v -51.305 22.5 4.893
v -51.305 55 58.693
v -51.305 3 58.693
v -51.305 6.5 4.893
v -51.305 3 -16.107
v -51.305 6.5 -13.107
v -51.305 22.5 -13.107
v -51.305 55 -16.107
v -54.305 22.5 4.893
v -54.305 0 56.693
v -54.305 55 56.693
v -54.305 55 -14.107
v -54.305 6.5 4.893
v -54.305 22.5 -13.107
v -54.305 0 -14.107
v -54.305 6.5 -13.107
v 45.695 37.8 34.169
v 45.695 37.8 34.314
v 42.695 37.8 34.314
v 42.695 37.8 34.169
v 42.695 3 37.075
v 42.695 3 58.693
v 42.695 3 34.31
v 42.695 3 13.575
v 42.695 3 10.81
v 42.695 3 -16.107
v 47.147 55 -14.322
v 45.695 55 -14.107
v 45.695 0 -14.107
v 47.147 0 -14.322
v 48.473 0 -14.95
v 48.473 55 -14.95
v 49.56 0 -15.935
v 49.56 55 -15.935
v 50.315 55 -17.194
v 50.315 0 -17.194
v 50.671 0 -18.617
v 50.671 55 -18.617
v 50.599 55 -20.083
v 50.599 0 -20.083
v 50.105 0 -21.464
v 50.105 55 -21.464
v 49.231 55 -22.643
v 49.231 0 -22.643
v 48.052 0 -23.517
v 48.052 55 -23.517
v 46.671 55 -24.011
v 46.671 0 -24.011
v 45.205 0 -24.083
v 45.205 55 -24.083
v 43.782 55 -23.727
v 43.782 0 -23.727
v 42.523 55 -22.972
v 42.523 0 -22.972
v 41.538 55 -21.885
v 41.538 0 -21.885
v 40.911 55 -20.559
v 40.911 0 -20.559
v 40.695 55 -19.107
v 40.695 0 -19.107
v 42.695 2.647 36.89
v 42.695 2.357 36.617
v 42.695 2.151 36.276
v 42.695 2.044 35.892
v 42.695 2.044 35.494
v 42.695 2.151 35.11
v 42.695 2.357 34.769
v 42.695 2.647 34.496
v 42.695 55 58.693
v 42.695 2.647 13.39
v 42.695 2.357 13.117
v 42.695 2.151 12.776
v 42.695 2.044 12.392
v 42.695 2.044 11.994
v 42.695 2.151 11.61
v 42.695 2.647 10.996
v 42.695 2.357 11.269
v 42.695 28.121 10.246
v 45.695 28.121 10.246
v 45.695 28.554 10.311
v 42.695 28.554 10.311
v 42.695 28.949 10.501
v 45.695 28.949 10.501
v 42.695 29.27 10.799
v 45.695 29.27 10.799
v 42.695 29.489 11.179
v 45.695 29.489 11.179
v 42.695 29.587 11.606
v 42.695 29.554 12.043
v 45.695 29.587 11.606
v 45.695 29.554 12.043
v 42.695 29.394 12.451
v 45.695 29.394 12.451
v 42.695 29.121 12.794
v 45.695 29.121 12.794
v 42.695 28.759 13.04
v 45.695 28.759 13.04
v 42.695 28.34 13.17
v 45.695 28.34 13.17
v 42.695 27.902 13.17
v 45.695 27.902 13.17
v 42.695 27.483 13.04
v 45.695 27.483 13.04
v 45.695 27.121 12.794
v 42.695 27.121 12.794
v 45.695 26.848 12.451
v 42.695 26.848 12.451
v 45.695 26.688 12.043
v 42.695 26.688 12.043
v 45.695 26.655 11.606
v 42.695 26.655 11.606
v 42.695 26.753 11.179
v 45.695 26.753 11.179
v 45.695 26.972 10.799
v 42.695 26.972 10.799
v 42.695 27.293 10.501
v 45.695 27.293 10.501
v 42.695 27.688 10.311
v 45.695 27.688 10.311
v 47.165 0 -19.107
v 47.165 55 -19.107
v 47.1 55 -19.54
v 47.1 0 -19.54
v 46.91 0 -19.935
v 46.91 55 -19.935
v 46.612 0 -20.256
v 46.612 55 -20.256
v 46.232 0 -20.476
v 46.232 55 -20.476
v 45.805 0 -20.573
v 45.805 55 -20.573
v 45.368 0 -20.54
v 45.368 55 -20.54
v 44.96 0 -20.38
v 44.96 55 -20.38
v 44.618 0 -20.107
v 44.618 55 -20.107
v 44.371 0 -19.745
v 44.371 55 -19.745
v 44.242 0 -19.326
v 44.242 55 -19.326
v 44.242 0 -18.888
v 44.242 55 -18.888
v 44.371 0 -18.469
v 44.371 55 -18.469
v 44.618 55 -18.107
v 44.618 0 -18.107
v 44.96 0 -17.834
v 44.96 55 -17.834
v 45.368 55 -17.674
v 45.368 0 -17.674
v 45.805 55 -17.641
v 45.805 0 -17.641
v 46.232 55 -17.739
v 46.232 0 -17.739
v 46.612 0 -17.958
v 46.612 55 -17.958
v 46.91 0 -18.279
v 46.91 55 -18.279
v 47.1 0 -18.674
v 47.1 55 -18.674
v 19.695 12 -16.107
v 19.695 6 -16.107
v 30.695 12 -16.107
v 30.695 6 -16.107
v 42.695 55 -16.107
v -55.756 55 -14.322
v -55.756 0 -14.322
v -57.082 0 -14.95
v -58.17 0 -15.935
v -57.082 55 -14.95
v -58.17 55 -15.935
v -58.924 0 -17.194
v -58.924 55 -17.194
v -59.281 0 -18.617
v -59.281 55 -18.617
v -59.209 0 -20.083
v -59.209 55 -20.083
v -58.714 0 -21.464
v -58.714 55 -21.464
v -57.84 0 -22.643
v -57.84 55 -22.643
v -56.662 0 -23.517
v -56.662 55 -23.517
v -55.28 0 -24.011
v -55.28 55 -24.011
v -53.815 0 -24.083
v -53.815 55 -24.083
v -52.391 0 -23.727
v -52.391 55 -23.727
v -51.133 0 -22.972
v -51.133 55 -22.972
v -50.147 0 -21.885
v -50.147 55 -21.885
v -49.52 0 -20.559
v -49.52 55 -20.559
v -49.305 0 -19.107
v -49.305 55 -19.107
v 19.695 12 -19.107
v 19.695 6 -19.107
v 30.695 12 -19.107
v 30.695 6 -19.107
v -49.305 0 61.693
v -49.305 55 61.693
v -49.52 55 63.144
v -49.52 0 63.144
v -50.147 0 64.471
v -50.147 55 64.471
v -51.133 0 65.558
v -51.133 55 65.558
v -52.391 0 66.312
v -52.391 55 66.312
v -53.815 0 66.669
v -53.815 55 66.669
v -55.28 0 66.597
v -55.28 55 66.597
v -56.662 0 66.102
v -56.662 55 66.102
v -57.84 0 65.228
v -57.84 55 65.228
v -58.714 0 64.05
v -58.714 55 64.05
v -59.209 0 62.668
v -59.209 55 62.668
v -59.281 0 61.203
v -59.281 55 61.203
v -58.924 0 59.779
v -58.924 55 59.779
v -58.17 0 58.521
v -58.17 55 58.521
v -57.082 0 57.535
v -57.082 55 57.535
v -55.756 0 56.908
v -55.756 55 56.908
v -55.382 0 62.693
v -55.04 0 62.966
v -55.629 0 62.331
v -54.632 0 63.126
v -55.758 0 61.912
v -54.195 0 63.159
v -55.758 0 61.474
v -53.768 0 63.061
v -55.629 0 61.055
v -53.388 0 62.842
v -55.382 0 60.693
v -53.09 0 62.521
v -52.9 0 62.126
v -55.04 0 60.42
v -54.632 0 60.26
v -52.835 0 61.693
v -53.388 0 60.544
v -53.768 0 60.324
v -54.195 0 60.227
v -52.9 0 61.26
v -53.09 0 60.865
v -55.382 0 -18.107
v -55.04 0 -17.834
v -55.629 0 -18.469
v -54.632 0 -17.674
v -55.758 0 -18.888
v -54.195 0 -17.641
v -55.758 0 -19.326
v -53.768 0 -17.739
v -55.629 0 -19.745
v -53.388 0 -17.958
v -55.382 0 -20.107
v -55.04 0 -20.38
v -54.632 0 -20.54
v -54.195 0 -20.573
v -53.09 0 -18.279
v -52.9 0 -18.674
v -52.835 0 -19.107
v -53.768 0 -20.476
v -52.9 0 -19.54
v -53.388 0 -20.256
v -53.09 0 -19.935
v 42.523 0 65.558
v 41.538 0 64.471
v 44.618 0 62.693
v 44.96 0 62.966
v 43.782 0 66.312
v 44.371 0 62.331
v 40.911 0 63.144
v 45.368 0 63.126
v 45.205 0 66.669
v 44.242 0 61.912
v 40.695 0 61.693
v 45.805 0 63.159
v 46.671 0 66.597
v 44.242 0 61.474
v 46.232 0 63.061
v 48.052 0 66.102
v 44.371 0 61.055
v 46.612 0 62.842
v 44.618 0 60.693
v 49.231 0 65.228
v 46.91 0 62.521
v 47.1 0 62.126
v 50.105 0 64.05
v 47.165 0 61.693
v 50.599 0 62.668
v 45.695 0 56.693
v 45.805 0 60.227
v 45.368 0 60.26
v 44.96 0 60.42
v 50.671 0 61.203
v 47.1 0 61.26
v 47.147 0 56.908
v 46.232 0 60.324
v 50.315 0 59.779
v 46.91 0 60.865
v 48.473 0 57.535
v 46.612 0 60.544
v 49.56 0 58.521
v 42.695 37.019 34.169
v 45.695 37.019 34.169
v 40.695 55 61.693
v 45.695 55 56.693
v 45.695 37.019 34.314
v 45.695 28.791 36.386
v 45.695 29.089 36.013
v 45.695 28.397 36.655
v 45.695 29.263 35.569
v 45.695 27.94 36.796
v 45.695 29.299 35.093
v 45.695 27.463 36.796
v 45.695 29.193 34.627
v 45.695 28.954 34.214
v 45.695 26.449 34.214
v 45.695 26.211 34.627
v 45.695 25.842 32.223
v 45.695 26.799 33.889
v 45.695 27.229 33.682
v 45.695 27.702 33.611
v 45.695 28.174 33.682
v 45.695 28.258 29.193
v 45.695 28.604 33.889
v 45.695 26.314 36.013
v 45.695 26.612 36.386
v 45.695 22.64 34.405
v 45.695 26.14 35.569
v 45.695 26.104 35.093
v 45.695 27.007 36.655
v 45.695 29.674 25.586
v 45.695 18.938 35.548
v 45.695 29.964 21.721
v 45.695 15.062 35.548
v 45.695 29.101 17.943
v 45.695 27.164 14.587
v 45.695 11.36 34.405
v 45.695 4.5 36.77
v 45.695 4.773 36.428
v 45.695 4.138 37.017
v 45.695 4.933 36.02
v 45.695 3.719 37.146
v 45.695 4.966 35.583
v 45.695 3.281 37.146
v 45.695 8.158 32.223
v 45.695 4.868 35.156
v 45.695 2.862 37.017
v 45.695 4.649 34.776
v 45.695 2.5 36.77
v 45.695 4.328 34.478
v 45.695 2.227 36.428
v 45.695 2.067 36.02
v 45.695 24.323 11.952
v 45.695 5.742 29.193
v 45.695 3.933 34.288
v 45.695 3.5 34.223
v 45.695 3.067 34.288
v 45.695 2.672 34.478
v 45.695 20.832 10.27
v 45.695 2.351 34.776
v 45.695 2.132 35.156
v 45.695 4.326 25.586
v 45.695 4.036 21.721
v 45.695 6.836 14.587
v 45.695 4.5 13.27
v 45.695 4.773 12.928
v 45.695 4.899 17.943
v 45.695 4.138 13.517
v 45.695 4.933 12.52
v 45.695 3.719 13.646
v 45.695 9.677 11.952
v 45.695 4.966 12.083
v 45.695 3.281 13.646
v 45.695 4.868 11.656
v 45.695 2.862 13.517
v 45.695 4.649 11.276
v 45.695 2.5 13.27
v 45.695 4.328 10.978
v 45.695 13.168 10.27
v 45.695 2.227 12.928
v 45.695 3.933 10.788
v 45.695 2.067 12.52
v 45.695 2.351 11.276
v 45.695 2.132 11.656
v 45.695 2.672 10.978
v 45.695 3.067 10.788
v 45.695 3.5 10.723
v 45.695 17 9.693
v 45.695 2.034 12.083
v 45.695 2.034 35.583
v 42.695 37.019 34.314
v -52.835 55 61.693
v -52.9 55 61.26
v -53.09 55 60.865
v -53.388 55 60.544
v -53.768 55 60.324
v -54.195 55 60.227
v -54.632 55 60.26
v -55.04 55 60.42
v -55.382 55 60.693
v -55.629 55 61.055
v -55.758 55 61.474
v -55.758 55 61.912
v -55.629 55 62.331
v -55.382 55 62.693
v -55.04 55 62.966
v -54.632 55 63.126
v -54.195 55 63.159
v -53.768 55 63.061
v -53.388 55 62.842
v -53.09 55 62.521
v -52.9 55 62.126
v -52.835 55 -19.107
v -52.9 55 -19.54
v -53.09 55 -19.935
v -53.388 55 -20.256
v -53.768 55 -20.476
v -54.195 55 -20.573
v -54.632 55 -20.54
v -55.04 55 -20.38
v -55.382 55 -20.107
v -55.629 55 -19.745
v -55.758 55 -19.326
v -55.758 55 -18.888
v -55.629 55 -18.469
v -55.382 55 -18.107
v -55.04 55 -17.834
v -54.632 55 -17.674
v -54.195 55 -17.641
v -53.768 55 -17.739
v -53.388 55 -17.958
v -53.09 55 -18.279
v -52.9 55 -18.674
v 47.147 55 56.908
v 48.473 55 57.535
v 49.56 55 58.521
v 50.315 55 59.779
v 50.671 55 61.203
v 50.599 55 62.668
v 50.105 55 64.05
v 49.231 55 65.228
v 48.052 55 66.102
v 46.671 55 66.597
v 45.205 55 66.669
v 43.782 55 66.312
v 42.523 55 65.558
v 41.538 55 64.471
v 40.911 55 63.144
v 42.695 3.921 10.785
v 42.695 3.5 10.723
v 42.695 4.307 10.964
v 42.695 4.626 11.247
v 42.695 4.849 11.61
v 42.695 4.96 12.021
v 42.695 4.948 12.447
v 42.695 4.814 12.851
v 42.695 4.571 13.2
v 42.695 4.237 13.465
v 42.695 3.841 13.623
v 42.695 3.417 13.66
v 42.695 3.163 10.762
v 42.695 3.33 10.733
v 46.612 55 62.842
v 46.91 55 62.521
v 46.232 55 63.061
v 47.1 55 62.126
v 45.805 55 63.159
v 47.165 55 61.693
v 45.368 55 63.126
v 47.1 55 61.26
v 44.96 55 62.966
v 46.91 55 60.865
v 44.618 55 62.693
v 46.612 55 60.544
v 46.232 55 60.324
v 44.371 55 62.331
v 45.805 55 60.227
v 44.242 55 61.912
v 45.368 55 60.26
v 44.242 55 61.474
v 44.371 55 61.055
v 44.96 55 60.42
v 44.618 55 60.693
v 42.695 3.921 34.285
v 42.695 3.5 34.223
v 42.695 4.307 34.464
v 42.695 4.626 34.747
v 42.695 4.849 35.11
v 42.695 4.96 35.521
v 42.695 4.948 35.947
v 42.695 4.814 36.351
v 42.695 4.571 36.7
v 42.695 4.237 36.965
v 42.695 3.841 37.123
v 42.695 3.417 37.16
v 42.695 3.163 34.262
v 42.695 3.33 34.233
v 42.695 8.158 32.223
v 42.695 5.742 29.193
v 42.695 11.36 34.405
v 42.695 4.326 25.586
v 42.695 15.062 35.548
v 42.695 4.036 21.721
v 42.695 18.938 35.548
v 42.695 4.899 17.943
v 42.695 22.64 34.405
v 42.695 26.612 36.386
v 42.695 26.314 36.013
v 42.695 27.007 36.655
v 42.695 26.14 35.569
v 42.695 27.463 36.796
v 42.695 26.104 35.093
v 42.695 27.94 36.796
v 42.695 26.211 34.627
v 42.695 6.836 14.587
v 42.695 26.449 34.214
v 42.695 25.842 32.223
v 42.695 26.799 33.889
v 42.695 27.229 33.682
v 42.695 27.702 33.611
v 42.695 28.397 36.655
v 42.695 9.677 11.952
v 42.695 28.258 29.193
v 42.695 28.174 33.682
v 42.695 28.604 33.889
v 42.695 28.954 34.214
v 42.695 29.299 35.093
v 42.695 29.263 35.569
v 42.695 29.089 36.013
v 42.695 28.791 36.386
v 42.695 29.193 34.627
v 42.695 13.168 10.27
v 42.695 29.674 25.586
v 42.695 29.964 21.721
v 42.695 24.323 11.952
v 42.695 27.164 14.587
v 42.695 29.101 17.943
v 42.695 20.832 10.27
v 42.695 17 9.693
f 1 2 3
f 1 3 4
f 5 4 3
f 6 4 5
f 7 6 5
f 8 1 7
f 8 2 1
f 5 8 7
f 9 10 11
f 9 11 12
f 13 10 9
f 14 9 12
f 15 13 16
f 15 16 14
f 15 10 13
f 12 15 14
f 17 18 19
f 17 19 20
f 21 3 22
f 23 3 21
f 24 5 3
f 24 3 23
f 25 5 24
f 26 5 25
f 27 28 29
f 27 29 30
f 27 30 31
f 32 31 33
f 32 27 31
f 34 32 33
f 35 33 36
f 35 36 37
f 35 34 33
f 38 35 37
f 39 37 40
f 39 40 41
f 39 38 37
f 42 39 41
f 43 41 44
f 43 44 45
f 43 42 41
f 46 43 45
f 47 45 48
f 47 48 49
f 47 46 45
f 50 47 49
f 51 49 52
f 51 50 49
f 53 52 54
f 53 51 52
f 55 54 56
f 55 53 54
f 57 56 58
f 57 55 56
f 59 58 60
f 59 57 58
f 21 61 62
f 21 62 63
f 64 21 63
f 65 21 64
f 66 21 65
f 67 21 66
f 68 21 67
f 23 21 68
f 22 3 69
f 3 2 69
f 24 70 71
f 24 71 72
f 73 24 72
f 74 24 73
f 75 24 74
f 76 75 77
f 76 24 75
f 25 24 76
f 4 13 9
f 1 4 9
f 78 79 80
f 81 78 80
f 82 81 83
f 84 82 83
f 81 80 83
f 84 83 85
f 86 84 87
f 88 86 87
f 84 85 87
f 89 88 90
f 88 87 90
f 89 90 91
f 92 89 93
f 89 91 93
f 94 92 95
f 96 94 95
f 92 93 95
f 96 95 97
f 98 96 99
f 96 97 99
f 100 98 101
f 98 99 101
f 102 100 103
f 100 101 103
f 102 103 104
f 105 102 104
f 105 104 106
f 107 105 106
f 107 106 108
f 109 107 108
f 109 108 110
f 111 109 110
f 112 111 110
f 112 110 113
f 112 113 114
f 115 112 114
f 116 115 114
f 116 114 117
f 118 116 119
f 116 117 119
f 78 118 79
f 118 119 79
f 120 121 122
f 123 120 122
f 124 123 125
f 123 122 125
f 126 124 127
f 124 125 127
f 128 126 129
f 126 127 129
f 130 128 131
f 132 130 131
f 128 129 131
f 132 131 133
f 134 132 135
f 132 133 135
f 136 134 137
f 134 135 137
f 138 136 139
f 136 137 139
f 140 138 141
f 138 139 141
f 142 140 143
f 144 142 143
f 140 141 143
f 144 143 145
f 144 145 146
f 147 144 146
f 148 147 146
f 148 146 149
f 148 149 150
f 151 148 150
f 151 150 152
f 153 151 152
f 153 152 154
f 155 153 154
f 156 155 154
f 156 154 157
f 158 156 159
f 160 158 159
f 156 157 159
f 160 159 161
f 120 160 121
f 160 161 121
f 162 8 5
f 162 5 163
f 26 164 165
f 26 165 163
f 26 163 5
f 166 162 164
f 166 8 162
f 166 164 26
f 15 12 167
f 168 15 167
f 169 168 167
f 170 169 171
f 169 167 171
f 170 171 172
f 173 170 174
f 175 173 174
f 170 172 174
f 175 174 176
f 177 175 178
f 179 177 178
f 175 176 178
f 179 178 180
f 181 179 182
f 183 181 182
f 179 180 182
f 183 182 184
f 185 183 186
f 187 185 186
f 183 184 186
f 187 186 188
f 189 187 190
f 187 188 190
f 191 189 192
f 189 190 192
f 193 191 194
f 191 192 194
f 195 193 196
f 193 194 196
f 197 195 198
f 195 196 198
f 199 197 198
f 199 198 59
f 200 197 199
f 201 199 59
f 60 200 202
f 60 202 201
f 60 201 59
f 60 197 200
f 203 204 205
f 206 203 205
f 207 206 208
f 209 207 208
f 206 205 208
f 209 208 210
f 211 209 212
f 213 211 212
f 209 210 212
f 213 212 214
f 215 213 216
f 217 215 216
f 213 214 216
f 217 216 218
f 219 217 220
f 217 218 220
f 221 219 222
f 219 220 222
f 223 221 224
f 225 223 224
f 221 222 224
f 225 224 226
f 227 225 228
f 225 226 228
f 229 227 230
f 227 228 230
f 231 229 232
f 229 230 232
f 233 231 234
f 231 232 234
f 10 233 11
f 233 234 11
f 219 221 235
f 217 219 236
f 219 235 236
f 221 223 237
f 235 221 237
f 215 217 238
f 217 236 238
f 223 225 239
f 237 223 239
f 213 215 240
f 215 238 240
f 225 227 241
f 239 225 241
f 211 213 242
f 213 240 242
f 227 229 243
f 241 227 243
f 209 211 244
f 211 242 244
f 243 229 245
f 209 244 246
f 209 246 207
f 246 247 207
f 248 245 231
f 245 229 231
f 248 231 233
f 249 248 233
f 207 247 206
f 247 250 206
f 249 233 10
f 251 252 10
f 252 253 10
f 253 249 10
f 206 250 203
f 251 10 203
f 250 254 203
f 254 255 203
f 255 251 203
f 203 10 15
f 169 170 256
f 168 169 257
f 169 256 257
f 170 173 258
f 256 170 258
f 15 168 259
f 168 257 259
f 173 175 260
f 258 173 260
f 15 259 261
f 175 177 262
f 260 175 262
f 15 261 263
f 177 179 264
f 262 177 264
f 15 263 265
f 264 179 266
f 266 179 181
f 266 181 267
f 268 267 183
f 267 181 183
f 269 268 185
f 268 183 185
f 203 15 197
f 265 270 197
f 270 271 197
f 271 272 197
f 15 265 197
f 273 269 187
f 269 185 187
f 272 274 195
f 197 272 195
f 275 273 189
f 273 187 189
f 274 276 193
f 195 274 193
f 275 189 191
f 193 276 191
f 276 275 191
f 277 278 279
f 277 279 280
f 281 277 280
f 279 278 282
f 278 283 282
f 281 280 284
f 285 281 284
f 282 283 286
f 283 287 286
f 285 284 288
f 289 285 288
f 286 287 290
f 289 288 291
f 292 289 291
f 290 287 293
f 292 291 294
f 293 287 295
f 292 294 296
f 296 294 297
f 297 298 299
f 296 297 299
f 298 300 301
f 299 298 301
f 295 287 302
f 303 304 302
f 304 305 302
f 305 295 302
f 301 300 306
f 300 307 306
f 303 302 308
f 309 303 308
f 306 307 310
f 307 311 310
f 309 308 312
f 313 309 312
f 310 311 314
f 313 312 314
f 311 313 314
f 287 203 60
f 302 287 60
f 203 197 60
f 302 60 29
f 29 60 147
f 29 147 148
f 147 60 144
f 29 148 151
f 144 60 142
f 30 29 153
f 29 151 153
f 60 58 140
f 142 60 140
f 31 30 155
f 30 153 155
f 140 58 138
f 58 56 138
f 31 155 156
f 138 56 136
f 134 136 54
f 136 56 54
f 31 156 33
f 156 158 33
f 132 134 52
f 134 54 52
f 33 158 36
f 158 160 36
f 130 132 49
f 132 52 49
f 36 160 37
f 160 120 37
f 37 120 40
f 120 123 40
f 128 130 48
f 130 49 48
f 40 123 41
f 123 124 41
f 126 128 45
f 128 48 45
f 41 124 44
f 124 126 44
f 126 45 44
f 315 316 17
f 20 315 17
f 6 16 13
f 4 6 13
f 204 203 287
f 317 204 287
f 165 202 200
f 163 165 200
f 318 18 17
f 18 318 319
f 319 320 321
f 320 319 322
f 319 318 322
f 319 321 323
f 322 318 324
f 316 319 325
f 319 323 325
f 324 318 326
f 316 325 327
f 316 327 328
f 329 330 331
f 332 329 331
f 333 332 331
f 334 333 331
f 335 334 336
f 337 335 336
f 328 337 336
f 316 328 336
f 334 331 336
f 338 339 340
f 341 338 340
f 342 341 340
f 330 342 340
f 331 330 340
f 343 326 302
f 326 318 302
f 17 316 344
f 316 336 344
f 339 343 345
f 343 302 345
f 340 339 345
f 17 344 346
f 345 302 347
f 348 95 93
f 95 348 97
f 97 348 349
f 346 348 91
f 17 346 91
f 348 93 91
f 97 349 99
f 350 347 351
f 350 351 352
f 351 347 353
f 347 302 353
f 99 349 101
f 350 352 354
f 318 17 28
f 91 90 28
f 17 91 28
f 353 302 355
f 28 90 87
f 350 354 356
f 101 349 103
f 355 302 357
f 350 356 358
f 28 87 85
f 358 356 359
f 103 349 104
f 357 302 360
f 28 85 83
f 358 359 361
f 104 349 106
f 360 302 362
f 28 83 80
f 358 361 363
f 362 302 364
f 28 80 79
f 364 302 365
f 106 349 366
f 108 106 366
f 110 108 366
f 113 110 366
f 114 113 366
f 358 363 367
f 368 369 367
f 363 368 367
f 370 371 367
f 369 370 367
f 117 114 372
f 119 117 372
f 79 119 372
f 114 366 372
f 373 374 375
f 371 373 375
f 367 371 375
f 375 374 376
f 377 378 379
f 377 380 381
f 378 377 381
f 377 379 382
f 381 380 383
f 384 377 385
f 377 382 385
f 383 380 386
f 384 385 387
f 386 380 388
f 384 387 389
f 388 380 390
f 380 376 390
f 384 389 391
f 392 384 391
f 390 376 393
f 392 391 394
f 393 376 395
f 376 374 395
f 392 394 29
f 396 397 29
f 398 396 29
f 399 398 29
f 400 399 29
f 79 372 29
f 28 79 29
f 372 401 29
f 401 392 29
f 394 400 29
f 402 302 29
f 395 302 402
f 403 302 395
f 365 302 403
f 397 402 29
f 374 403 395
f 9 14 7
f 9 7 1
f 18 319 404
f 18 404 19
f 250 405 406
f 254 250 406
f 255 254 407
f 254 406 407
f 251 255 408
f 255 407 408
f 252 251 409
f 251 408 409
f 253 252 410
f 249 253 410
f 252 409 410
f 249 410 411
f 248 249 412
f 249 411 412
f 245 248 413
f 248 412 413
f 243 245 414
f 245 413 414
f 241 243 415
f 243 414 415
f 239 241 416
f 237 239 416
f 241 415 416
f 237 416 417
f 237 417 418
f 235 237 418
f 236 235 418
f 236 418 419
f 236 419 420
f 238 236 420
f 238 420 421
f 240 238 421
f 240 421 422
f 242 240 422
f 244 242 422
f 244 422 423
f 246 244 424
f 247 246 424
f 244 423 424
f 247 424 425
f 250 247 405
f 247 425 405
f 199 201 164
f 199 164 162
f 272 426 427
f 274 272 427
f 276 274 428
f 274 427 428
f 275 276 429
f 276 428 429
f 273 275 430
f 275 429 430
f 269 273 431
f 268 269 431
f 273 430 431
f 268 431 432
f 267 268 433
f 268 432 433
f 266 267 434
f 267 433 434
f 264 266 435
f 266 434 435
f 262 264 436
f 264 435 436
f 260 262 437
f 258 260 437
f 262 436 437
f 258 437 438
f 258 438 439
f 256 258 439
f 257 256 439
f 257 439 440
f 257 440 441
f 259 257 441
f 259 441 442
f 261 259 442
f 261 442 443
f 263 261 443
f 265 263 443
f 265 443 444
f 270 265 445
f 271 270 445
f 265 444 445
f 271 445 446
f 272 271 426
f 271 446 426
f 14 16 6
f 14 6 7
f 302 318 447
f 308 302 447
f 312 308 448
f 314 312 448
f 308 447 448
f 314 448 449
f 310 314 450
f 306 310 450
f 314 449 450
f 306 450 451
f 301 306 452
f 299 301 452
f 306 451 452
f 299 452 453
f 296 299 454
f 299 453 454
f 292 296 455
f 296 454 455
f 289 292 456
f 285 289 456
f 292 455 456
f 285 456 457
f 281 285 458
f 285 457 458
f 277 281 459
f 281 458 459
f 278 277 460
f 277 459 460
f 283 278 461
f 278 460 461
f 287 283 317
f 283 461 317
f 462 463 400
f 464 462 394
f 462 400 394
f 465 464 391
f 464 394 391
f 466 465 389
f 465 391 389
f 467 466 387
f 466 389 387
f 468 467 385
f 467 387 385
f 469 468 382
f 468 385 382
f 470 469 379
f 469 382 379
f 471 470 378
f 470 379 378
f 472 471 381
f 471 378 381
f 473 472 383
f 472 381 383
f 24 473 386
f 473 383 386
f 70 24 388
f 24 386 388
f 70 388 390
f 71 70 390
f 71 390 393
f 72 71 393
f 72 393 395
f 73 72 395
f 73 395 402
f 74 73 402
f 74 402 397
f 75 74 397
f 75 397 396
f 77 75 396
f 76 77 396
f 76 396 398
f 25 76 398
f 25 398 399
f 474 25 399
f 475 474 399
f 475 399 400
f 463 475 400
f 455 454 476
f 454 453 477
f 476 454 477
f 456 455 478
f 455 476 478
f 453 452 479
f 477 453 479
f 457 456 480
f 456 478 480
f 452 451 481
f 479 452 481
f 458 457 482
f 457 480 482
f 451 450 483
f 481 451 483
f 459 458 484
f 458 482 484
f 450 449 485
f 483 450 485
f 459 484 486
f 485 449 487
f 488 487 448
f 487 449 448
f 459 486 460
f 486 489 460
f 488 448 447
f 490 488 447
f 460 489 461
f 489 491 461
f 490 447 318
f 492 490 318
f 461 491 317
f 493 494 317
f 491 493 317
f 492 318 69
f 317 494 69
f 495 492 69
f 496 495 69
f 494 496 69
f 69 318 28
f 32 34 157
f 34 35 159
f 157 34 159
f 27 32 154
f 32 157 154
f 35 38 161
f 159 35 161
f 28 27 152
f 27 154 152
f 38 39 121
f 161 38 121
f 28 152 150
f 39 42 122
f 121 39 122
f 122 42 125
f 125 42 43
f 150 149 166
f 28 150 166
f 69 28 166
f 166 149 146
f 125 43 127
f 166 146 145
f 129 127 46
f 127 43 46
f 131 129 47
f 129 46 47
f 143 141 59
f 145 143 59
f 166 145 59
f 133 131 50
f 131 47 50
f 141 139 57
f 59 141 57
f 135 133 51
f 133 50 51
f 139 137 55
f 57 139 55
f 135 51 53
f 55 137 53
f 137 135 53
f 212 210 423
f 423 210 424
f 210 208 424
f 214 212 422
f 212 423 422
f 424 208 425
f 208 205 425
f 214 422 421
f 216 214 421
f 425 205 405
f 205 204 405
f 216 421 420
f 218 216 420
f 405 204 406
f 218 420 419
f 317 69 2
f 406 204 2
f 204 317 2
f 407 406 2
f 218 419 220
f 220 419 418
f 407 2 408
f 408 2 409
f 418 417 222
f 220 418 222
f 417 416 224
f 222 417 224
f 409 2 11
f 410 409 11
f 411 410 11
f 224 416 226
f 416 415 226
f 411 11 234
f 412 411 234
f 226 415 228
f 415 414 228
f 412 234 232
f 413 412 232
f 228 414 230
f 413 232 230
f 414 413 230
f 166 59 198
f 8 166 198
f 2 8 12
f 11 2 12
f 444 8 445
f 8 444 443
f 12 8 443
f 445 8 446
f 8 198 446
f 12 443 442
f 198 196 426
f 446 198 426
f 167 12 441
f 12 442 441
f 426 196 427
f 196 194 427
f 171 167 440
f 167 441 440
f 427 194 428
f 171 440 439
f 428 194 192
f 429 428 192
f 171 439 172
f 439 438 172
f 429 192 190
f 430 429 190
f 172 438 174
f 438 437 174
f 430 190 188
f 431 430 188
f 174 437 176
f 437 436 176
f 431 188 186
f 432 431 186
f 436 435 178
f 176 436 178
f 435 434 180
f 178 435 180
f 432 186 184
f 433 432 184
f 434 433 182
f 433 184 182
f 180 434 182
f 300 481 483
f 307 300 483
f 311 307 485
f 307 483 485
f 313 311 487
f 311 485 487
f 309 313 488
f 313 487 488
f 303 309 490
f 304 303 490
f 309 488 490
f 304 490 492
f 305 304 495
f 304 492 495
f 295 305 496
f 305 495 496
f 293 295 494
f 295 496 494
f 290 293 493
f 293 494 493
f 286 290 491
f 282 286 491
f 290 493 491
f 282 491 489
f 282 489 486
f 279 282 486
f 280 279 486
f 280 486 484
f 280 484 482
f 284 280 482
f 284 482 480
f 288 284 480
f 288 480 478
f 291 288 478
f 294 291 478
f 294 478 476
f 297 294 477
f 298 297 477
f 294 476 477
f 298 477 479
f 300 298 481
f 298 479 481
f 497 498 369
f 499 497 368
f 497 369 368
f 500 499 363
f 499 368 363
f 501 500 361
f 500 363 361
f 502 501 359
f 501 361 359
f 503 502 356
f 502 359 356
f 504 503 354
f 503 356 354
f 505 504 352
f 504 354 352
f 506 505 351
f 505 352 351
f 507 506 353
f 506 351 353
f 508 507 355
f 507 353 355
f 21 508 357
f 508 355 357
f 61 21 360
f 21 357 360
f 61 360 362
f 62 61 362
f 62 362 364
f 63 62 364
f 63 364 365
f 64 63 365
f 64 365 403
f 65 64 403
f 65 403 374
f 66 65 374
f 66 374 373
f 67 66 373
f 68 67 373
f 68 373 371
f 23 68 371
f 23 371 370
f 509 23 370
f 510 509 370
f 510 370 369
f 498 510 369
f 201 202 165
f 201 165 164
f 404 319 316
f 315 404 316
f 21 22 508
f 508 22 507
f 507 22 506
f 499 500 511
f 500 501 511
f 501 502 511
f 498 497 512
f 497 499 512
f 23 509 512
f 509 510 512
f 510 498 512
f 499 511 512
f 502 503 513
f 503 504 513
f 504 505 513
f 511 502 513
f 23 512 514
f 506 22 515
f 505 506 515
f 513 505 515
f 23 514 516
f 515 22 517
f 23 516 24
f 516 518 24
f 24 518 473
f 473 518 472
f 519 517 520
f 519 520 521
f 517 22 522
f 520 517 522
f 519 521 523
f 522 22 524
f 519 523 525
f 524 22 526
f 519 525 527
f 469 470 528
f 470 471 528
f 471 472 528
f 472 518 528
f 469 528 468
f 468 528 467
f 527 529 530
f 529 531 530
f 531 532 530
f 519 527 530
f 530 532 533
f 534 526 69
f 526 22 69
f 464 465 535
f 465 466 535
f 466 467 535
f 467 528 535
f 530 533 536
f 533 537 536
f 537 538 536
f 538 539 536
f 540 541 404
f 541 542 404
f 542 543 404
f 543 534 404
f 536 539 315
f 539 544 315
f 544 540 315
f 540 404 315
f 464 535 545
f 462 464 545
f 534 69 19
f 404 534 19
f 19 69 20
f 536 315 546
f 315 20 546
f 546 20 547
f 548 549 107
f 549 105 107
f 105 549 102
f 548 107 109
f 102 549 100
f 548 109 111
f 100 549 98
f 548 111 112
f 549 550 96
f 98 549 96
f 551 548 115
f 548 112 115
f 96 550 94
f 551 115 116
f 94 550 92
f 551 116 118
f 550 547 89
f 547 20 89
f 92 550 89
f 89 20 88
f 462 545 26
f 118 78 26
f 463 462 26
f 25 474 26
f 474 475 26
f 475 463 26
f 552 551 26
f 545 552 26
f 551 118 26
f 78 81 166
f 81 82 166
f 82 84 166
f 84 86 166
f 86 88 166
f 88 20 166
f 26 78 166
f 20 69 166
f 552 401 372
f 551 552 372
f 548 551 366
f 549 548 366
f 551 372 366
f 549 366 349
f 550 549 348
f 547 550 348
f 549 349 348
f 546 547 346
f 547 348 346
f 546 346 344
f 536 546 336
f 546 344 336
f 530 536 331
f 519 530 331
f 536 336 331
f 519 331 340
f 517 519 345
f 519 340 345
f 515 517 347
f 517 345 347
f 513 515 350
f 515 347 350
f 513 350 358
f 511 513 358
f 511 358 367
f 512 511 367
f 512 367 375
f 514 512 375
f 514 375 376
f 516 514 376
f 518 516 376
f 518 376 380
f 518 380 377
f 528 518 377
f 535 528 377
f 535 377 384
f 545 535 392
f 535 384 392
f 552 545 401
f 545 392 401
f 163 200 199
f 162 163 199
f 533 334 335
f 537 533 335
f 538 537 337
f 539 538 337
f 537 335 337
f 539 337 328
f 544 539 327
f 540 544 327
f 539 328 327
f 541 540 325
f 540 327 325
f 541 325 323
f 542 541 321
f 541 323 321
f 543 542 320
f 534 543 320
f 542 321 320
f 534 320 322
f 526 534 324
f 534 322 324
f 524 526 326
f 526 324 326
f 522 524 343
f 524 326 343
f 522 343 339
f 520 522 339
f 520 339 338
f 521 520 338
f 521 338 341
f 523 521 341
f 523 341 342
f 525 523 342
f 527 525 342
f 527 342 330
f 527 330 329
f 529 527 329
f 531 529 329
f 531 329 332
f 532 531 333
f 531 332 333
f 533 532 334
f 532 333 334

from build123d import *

# Parameters (mm, degrees)
SKETCH1_W           = 100
SKETCH1_H           = 80.8
BOSS_EXTRUDE1_DEPTH = 55
SKETCH2_W           = 94
SKETCH2_H           = 74.8
CUT_EXTRUDE1_DEPTH  = 52
SKETCH3_W           = 18
SKETCH3_H           = 16
CUT_EXTRUDE2_DEPTH  = 3
SKETCH4_W           = 11
SKETCH4_H           = 6
CUT_EXTRUDE3_DEPTH  = 3
SKETCH5_R           = 13
SKETCH5_W           = 0.144392858
SKETCH5_H           = 0.781479989
CUT_EXTRUDE5_DEPTH  = 3
SKETCH7_R           = 1.601751043
SKETCH7_R_2         = 1.47
CUT_EXTRUDE6_DEPTH  = 3
BOSS_EXTRUDE2_DEPTH = 55
BOSS_EXTRUDE3_DEPTH = 55
BOSS_EXTRUDE4_DEPTH = 55
BOSS_EXTRUDE5_DEPTH = 55
SKETCH13_R          = 1.47
CUT_EXTRUDE7_DEPTH  = 55
SKETCH14_R          = 1.47
CUT_EXTRUDE8_DEPTH  = 55
SKETCH15_R          = 1.47
CUT_EXTRUDE9_DEPTH  = 55
SKETCH16_R          = 1.47
CUT_EXTRUDE10_DEPTH = 55


with BuildPart() as part:
    # Sketch1 → Boss-Extrude1 (new body)
    with BuildSketch(Plane(origin=(0, 0, 0), x_dir=(1, 0, 0), z_dir=(0, 1, 0))):
        with Locations((-4.304593931, -21.292828061)):
            Rectangle(SKETCH1_W, SKETCH1_H)
    extrude(amount=BOSS_EXTRUDE1_DEPTH)

    # Sketch2 → Cut-Extrude1 (cut)
    with BuildSketch(Plane(origin=(0, 55, 0), x_dir=(1, 0, 0), z_dir=(0, 1, 0))):
        with Locations((-4.304593931, -21.292828061)):
            Rectangle(SKETCH2_W, SKETCH2_H)
    extrude(amount=-CUT_EXTRUDE1_DEPTH, mode=Mode.SUBTRACT)

    # Sketch3 → Cut-Extrude2 (cut)
    with BuildSketch(Plane.ZY.offset(54.304593931)):
        with Locations((-4.107171939, 14.5)):
            Rectangle(SKETCH3_W, SKETCH3_H)
    extrude(amount=-CUT_EXTRUDE2_DEPTH, mode=Mode.SUBTRACT)

    # Sketch4 → Cut-Extrude3 (cut)
    with BuildSketch(Plane(origin=(0, 0, -19.107171939), x_dir=(-1, 0, 0), z_dir=(0, 0, -1))):
        with Locations((-25.195406069, 9)):
            Rectangle(SKETCH4_W, SKETCH4_H)
    extrude(amount=-CUT_EXTRUDE3_DEPTH, mode=Mode.SUBTRACT)

    # Sketch5 → Cut-Extrude5 (cut)
    with BuildSketch(Plane(origin=(45.695406069, 0, 0), x_dir=(0, 0, -1), z_dir=(1, 0, 0))):
        with Locations((-22.692828061, 17)):
            Circle(SKETCH5_R)
        with Locations((-34.241433139, 37.409557734)):
            Rectangle(SKETCH5_W, SKETCH5_H)
    extrude(amount=-CUT_EXTRUDE5_DEPTH, mode=Mode.SUBTRACT)

    # Sketch7 → Cut-Extrude6 (cut)
    with BuildSketch(Plane(origin=(45.695406069, 0, 0), x_dir=(0, 0, -1), z_dir=(1, 0, 0))):
        with Locations((-35.2122597, 27.701622842)):
            Circle(SKETCH7_R)
        with Locations((-35.692828061, 3.5)):
            Circle(SKETCH7_R_2)
        with Locations((-12.192828061, 3.5)):
            Circle(SKETCH7_R_2)
        with Locations((-11.71600068, 28.120922326)):
            Circle(SKETCH7_R_2)
    extrude(amount=-CUT_EXTRUDE6_DEPTH, mode=Mode.SUBTRACT)

    # Sketch9 → Boss-Extrude2 (add)
    with BuildSketch(Plane(origin=(0, 55, 0), x_dir=(1, 0, 0), z_dir=(0, 1, 0))):
        with BuildLine():
            Line((41.695406069, 16.107171939), (42.695406069, 16.107171939))
            Line((42.695406069, 16.107171939), (42.695406069, 15.107171939))
            ThreePointArc((42.695406069, 15.107171939), (49.230939975, 22.642705845), (41.695406069, 16.107171939))
        make_face()
    extrude(amount=-BOSS_EXTRUDE2_DEPTH)

    # Sketch10 → Boss-Extrude3 (add)
    with BuildSketch(Plane(origin=(0, 55, 0), x_dir=(1, 0, 0), z_dir=(0, 1, 0))):
        with BuildLine():
            Line((-51.304593931, -57.692828061), (-51.304593931, -58.692828061))
            Line((-51.304593931, -58.692828061), (-50.304593931, -58.692828061))
            ThreePointArc((-50.304593931, -58.692828061), (-57.840127837, -65.228361967), (-51.304593931, -57.692828061))
        make_face()
    extrude(amount=-BOSS_EXTRUDE3_DEPTH)

    # Sketch11 → Boss-Extrude4 (add)
    with BuildSketch(Plane(origin=(0, 55, 0), x_dir=(1, 0, 0), z_dir=(0, 1, 0))):
        with BuildLine():
            Line((-50.304593931, 16.107171939), (-51.304593931, 16.107171939))
            Line((-51.304593931, 16.107171939), (-51.304593931, 15.107171939))
            ThreePointArc((-51.304593931, 15.107171939), (-57.840127837, 22.642705845), (-50.304593931, 16.107171939))
        make_face()
    extrude(amount=-BOSS_EXTRUDE4_DEPTH)

    # Sketch12 → Boss-Extrude5 (add)
    with BuildSketch(Plane(origin=(0, 55, 0), x_dir=(1, 0, 0), z_dir=(0, 1, 0))):
        with BuildLine():
            Line((41.695406069, -58.692828061), (42.695406069, -58.692828061))
            Line((42.695406069, -58.692828061), (42.695406069, -57.692828061))
            ThreePointArc((42.695406069, -57.692828061), (49.230939975, -65.228361967), (41.695406069, -58.692828061))
        make_face()
    extrude(amount=-BOSS_EXTRUDE5_DEPTH)

    # Sketch13 → Cut-Extrude7 (cut)
    with BuildSketch(Plane(origin=(0, 55, 0), x_dir=(1, 0, 0), z_dir=(0, 1, 0))):
        with Locations((45.695406069, -61.692828061)):
            Circle(SKETCH13_R)
    extrude(amount=-CUT_EXTRUDE7_DEPTH, mode=Mode.SUBTRACT)

    # Sketch14 → Cut-Extrude8 (cut)
    with BuildSketch(Plane(origin=(0, 55, 0), x_dir=(1, 0, 0), z_dir=(0, 1, 0))):
        with Locations((45.695406069, 19.107171939)):
            Circle(SKETCH14_R)
    extrude(amount=-CUT_EXTRUDE8_DEPTH, mode=Mode.SUBTRACT)

    # Sketch15 → Cut-Extrude9 (cut)
    with BuildSketch(Plane(origin=(0, 55, 0), x_dir=(1, 0, 0), z_dir=(0, 1, 0))):
        with Locations((-54.304593931, 19.107171939)):
            Circle(SKETCH15_R)
    extrude(amount=-CUT_EXTRUDE9_DEPTH, mode=Mode.SUBTRACT)

    # Sketch16 → Cut-Extrude10 (cut)
    with BuildSketch(Plane(origin=(0, 55, 0), x_dir=(1, 0, 0), z_dir=(0, 1, 0))):
        with Locations((-54.304593931, -61.692828061)):
            Circle(SKETCH16_R)
    extrude(amount=-CUT_EXTRUDE10_DEPTH, mode=Mode.SUBTRACT)


solid = part.part
